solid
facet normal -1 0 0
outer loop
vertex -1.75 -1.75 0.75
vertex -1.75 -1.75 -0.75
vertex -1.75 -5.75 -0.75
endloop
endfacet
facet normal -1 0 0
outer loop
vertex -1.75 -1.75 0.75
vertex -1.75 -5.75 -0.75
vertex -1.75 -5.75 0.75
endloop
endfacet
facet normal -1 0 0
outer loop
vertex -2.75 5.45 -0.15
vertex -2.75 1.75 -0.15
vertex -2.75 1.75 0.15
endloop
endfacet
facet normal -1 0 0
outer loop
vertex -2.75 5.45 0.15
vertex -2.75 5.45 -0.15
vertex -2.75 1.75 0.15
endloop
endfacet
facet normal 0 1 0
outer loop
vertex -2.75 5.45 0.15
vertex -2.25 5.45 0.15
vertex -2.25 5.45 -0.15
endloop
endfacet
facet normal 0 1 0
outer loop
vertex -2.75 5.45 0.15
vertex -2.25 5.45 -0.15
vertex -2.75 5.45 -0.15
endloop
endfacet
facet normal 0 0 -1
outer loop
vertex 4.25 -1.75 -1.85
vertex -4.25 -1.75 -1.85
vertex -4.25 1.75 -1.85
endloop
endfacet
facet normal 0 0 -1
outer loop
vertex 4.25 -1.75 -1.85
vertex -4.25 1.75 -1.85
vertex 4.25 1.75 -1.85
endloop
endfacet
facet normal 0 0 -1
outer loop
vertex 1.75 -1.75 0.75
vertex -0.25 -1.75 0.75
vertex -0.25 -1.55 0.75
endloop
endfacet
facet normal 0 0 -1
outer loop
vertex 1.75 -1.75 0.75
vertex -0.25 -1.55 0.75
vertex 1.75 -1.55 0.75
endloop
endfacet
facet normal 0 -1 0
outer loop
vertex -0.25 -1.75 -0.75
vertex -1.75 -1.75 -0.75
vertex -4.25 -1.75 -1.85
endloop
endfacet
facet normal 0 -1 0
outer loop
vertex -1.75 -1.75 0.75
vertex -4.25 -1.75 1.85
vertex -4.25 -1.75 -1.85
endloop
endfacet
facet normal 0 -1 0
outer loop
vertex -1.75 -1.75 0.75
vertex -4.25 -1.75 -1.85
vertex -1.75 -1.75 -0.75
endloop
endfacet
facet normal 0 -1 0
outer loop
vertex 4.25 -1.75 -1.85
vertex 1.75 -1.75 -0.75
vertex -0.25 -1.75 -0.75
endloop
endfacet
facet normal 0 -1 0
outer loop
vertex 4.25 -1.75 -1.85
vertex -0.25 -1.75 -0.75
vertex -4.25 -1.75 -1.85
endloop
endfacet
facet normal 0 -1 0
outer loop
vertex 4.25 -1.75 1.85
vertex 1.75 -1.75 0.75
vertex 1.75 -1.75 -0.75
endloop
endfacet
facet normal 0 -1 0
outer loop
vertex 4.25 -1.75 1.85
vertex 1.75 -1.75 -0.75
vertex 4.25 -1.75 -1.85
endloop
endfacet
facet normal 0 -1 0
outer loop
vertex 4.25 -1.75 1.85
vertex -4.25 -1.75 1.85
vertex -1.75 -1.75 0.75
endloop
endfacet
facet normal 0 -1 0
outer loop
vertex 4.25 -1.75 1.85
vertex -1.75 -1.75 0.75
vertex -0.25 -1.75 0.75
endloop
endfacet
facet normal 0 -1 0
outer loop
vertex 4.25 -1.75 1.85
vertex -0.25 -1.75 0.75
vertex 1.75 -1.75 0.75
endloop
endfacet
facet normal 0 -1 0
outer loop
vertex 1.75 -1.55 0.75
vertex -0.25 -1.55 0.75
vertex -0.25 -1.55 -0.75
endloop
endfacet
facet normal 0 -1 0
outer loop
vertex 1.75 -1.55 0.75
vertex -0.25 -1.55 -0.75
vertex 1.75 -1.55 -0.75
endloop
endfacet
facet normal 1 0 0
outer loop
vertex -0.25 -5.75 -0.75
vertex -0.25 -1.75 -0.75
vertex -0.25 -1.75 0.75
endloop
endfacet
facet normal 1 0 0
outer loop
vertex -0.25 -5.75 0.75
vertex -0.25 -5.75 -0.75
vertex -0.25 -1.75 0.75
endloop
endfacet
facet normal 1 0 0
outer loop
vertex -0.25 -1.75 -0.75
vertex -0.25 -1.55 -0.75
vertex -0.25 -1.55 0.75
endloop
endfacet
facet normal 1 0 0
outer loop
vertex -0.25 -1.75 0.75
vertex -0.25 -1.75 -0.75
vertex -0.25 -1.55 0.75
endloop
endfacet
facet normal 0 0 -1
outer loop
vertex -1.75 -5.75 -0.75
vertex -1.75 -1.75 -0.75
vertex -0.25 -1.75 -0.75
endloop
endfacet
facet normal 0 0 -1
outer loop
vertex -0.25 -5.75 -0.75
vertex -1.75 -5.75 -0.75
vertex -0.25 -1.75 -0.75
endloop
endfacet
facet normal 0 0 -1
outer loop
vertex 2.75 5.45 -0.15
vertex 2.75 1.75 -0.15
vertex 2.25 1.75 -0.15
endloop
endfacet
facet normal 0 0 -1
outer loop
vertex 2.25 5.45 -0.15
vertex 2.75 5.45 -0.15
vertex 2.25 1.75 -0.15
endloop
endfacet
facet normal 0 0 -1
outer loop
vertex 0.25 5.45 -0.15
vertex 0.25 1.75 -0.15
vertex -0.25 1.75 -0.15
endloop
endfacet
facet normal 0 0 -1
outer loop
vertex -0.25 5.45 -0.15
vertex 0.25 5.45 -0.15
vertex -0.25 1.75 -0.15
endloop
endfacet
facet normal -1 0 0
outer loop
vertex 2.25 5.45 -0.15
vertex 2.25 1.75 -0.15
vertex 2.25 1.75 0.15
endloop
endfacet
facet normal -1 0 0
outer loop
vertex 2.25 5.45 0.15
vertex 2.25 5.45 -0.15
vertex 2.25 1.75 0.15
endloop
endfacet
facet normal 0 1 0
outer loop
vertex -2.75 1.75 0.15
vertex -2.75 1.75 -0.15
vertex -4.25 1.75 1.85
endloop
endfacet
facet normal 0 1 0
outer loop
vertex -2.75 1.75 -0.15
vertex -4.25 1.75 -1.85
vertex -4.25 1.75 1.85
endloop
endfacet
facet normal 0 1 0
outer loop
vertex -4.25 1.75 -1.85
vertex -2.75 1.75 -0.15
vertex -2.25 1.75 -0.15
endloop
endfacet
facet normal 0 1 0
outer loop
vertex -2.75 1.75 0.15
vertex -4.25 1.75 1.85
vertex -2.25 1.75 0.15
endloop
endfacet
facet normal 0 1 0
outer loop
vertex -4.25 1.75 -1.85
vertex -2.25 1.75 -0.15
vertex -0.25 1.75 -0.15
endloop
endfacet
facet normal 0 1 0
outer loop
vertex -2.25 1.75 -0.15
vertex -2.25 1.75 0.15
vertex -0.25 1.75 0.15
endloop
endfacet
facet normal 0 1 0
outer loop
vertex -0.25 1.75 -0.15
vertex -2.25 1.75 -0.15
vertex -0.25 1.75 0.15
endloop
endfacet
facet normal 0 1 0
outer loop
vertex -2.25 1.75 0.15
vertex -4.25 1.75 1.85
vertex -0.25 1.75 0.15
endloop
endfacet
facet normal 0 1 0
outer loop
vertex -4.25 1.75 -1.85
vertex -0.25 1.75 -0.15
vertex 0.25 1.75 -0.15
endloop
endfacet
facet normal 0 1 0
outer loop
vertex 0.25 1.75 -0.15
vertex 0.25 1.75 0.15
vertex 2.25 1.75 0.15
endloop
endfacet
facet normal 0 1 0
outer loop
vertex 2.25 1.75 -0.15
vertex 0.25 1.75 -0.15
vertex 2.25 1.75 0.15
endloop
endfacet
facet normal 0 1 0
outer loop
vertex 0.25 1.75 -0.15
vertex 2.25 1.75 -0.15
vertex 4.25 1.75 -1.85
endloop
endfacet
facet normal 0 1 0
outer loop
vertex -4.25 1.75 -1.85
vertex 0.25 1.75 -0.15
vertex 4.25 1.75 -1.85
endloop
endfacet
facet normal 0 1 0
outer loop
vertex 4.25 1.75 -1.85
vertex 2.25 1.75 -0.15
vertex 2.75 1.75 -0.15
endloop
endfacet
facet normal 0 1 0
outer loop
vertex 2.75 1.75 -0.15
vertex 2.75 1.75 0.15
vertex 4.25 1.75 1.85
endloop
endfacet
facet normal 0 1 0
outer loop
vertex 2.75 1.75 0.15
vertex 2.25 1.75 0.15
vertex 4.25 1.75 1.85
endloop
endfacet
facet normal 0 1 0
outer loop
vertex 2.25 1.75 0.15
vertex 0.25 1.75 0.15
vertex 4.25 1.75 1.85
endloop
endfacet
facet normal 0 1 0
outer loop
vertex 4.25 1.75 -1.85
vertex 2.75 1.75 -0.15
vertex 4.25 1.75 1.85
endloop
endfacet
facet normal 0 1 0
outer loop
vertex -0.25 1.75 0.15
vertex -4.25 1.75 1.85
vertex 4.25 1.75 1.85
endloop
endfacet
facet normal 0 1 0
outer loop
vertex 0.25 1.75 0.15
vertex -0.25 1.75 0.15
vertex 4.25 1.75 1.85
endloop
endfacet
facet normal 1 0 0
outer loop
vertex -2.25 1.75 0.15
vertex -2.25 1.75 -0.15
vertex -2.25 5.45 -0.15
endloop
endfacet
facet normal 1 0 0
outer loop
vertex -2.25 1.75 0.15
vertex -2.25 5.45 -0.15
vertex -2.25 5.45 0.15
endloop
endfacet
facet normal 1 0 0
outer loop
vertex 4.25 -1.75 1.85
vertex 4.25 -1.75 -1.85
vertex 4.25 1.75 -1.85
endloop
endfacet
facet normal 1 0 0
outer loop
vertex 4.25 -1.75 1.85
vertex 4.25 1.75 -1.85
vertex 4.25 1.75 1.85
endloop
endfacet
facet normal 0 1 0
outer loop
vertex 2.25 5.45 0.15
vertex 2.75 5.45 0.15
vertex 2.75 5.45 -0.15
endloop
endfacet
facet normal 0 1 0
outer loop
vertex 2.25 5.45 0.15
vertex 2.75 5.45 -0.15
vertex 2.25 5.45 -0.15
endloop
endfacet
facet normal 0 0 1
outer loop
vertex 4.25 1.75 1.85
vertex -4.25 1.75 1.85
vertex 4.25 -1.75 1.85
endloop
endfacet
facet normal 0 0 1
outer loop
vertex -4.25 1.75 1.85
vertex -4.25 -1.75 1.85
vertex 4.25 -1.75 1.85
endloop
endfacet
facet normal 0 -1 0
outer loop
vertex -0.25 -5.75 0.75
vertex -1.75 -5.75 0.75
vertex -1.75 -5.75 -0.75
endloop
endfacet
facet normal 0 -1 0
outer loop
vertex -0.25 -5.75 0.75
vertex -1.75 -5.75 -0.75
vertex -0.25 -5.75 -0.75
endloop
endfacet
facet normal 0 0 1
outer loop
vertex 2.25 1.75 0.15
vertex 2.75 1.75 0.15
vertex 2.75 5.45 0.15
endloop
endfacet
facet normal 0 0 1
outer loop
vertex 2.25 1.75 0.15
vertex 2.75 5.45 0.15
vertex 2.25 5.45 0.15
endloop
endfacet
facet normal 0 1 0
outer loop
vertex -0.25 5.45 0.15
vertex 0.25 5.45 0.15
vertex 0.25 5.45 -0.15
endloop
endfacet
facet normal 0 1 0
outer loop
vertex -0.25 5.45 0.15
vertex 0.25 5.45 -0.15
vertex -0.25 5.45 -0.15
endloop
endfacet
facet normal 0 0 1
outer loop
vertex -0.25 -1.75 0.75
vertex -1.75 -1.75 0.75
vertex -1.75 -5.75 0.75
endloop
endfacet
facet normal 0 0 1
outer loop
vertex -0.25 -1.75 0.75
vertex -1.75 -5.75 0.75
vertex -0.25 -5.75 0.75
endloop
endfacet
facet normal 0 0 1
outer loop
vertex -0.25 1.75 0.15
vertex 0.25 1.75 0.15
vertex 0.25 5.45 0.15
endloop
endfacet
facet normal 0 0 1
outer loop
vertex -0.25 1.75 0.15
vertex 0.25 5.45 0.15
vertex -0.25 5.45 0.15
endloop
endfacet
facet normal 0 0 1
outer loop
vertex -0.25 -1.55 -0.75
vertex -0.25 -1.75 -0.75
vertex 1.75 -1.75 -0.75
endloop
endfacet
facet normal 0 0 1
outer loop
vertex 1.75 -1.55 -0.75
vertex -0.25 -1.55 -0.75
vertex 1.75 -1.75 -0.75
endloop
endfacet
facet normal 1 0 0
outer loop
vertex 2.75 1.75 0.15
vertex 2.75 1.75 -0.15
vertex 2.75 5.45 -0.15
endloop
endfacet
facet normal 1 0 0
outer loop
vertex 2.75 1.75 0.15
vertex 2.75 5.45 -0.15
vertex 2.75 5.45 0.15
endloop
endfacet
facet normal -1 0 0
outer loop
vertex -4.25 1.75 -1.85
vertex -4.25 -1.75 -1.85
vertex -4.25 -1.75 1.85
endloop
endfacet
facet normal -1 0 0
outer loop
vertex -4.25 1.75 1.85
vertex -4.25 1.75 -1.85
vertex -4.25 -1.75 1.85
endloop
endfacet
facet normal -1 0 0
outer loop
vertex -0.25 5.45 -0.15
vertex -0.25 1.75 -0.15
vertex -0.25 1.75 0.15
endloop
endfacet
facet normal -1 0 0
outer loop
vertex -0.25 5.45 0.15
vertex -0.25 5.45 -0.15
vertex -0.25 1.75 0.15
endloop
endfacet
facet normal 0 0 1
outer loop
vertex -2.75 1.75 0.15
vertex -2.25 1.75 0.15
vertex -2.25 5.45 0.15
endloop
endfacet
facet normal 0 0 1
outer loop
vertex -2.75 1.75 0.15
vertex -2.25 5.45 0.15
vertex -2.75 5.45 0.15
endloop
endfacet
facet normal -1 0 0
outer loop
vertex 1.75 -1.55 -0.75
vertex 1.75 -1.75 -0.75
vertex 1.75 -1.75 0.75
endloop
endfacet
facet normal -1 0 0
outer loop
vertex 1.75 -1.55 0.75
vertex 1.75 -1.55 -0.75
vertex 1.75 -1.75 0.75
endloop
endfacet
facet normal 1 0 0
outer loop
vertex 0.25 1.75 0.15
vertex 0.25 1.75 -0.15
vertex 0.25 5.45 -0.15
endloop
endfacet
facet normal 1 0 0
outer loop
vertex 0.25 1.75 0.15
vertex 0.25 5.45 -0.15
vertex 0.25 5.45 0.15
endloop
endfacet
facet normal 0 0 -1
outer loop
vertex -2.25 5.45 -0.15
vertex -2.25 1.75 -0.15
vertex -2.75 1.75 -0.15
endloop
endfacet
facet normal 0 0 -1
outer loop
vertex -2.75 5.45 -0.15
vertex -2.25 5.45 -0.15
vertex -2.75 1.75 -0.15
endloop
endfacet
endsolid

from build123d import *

# Parameters (mm, degrees)
F0_W     = 8.5
F0_H     = 3.7
F1_DEPTH = 1.75
F2_W     = 0.5
F2_H     = 0.3
F3_DEPTH = 3.7
F4_W     = 2
F4_H     = 1.5
F5_DEPTH = 0.2
F4_W_2   = 1.5
F6_DEPTH = 4


with BuildPart() as f1:
    # F0 (on Front) → F1 (new body, symmetric)
    with BuildSketch(Plane.XZ):
        Rectangle(F0_W, F0_H)
    extrude(amount=F1_DEPTH, both=True)

    # F2 (on face) → F3 (join)
    with BuildSketch(Plane(origin=(0, 1.75, 0), x_dir=(-1, 0, 0), z_dir=(0, 1, 0))):
        Rectangle(F2_W, F2_H)
        with Locations((2.5, 0)):
            Rectangle(F2_W, F2_H)
        with Locations((-2.5, 0)):
            Rectangle(F2_W, F2_H)
    extrude(amount=F3_DEPTH)

    # F4 (on face) → F5 (cut)
    with BuildSketch(Plane.XZ.offset(1.75)):
        with Locations((0.75, 0)):
            Rectangle(F4_W, F4_H)
    extrude(amount=-F5_DEPTH, mode=Mode.SUBTRACT)

    # F4 (on face) → F6 (join)
    with BuildSketch(Plane.XZ.offset(1.75)):
        with Locations((-1, 0)):
            Rectangle(F4_W_2, F4_H)
    extrude(amount=F6_DEPTH)


solid = f1.part
